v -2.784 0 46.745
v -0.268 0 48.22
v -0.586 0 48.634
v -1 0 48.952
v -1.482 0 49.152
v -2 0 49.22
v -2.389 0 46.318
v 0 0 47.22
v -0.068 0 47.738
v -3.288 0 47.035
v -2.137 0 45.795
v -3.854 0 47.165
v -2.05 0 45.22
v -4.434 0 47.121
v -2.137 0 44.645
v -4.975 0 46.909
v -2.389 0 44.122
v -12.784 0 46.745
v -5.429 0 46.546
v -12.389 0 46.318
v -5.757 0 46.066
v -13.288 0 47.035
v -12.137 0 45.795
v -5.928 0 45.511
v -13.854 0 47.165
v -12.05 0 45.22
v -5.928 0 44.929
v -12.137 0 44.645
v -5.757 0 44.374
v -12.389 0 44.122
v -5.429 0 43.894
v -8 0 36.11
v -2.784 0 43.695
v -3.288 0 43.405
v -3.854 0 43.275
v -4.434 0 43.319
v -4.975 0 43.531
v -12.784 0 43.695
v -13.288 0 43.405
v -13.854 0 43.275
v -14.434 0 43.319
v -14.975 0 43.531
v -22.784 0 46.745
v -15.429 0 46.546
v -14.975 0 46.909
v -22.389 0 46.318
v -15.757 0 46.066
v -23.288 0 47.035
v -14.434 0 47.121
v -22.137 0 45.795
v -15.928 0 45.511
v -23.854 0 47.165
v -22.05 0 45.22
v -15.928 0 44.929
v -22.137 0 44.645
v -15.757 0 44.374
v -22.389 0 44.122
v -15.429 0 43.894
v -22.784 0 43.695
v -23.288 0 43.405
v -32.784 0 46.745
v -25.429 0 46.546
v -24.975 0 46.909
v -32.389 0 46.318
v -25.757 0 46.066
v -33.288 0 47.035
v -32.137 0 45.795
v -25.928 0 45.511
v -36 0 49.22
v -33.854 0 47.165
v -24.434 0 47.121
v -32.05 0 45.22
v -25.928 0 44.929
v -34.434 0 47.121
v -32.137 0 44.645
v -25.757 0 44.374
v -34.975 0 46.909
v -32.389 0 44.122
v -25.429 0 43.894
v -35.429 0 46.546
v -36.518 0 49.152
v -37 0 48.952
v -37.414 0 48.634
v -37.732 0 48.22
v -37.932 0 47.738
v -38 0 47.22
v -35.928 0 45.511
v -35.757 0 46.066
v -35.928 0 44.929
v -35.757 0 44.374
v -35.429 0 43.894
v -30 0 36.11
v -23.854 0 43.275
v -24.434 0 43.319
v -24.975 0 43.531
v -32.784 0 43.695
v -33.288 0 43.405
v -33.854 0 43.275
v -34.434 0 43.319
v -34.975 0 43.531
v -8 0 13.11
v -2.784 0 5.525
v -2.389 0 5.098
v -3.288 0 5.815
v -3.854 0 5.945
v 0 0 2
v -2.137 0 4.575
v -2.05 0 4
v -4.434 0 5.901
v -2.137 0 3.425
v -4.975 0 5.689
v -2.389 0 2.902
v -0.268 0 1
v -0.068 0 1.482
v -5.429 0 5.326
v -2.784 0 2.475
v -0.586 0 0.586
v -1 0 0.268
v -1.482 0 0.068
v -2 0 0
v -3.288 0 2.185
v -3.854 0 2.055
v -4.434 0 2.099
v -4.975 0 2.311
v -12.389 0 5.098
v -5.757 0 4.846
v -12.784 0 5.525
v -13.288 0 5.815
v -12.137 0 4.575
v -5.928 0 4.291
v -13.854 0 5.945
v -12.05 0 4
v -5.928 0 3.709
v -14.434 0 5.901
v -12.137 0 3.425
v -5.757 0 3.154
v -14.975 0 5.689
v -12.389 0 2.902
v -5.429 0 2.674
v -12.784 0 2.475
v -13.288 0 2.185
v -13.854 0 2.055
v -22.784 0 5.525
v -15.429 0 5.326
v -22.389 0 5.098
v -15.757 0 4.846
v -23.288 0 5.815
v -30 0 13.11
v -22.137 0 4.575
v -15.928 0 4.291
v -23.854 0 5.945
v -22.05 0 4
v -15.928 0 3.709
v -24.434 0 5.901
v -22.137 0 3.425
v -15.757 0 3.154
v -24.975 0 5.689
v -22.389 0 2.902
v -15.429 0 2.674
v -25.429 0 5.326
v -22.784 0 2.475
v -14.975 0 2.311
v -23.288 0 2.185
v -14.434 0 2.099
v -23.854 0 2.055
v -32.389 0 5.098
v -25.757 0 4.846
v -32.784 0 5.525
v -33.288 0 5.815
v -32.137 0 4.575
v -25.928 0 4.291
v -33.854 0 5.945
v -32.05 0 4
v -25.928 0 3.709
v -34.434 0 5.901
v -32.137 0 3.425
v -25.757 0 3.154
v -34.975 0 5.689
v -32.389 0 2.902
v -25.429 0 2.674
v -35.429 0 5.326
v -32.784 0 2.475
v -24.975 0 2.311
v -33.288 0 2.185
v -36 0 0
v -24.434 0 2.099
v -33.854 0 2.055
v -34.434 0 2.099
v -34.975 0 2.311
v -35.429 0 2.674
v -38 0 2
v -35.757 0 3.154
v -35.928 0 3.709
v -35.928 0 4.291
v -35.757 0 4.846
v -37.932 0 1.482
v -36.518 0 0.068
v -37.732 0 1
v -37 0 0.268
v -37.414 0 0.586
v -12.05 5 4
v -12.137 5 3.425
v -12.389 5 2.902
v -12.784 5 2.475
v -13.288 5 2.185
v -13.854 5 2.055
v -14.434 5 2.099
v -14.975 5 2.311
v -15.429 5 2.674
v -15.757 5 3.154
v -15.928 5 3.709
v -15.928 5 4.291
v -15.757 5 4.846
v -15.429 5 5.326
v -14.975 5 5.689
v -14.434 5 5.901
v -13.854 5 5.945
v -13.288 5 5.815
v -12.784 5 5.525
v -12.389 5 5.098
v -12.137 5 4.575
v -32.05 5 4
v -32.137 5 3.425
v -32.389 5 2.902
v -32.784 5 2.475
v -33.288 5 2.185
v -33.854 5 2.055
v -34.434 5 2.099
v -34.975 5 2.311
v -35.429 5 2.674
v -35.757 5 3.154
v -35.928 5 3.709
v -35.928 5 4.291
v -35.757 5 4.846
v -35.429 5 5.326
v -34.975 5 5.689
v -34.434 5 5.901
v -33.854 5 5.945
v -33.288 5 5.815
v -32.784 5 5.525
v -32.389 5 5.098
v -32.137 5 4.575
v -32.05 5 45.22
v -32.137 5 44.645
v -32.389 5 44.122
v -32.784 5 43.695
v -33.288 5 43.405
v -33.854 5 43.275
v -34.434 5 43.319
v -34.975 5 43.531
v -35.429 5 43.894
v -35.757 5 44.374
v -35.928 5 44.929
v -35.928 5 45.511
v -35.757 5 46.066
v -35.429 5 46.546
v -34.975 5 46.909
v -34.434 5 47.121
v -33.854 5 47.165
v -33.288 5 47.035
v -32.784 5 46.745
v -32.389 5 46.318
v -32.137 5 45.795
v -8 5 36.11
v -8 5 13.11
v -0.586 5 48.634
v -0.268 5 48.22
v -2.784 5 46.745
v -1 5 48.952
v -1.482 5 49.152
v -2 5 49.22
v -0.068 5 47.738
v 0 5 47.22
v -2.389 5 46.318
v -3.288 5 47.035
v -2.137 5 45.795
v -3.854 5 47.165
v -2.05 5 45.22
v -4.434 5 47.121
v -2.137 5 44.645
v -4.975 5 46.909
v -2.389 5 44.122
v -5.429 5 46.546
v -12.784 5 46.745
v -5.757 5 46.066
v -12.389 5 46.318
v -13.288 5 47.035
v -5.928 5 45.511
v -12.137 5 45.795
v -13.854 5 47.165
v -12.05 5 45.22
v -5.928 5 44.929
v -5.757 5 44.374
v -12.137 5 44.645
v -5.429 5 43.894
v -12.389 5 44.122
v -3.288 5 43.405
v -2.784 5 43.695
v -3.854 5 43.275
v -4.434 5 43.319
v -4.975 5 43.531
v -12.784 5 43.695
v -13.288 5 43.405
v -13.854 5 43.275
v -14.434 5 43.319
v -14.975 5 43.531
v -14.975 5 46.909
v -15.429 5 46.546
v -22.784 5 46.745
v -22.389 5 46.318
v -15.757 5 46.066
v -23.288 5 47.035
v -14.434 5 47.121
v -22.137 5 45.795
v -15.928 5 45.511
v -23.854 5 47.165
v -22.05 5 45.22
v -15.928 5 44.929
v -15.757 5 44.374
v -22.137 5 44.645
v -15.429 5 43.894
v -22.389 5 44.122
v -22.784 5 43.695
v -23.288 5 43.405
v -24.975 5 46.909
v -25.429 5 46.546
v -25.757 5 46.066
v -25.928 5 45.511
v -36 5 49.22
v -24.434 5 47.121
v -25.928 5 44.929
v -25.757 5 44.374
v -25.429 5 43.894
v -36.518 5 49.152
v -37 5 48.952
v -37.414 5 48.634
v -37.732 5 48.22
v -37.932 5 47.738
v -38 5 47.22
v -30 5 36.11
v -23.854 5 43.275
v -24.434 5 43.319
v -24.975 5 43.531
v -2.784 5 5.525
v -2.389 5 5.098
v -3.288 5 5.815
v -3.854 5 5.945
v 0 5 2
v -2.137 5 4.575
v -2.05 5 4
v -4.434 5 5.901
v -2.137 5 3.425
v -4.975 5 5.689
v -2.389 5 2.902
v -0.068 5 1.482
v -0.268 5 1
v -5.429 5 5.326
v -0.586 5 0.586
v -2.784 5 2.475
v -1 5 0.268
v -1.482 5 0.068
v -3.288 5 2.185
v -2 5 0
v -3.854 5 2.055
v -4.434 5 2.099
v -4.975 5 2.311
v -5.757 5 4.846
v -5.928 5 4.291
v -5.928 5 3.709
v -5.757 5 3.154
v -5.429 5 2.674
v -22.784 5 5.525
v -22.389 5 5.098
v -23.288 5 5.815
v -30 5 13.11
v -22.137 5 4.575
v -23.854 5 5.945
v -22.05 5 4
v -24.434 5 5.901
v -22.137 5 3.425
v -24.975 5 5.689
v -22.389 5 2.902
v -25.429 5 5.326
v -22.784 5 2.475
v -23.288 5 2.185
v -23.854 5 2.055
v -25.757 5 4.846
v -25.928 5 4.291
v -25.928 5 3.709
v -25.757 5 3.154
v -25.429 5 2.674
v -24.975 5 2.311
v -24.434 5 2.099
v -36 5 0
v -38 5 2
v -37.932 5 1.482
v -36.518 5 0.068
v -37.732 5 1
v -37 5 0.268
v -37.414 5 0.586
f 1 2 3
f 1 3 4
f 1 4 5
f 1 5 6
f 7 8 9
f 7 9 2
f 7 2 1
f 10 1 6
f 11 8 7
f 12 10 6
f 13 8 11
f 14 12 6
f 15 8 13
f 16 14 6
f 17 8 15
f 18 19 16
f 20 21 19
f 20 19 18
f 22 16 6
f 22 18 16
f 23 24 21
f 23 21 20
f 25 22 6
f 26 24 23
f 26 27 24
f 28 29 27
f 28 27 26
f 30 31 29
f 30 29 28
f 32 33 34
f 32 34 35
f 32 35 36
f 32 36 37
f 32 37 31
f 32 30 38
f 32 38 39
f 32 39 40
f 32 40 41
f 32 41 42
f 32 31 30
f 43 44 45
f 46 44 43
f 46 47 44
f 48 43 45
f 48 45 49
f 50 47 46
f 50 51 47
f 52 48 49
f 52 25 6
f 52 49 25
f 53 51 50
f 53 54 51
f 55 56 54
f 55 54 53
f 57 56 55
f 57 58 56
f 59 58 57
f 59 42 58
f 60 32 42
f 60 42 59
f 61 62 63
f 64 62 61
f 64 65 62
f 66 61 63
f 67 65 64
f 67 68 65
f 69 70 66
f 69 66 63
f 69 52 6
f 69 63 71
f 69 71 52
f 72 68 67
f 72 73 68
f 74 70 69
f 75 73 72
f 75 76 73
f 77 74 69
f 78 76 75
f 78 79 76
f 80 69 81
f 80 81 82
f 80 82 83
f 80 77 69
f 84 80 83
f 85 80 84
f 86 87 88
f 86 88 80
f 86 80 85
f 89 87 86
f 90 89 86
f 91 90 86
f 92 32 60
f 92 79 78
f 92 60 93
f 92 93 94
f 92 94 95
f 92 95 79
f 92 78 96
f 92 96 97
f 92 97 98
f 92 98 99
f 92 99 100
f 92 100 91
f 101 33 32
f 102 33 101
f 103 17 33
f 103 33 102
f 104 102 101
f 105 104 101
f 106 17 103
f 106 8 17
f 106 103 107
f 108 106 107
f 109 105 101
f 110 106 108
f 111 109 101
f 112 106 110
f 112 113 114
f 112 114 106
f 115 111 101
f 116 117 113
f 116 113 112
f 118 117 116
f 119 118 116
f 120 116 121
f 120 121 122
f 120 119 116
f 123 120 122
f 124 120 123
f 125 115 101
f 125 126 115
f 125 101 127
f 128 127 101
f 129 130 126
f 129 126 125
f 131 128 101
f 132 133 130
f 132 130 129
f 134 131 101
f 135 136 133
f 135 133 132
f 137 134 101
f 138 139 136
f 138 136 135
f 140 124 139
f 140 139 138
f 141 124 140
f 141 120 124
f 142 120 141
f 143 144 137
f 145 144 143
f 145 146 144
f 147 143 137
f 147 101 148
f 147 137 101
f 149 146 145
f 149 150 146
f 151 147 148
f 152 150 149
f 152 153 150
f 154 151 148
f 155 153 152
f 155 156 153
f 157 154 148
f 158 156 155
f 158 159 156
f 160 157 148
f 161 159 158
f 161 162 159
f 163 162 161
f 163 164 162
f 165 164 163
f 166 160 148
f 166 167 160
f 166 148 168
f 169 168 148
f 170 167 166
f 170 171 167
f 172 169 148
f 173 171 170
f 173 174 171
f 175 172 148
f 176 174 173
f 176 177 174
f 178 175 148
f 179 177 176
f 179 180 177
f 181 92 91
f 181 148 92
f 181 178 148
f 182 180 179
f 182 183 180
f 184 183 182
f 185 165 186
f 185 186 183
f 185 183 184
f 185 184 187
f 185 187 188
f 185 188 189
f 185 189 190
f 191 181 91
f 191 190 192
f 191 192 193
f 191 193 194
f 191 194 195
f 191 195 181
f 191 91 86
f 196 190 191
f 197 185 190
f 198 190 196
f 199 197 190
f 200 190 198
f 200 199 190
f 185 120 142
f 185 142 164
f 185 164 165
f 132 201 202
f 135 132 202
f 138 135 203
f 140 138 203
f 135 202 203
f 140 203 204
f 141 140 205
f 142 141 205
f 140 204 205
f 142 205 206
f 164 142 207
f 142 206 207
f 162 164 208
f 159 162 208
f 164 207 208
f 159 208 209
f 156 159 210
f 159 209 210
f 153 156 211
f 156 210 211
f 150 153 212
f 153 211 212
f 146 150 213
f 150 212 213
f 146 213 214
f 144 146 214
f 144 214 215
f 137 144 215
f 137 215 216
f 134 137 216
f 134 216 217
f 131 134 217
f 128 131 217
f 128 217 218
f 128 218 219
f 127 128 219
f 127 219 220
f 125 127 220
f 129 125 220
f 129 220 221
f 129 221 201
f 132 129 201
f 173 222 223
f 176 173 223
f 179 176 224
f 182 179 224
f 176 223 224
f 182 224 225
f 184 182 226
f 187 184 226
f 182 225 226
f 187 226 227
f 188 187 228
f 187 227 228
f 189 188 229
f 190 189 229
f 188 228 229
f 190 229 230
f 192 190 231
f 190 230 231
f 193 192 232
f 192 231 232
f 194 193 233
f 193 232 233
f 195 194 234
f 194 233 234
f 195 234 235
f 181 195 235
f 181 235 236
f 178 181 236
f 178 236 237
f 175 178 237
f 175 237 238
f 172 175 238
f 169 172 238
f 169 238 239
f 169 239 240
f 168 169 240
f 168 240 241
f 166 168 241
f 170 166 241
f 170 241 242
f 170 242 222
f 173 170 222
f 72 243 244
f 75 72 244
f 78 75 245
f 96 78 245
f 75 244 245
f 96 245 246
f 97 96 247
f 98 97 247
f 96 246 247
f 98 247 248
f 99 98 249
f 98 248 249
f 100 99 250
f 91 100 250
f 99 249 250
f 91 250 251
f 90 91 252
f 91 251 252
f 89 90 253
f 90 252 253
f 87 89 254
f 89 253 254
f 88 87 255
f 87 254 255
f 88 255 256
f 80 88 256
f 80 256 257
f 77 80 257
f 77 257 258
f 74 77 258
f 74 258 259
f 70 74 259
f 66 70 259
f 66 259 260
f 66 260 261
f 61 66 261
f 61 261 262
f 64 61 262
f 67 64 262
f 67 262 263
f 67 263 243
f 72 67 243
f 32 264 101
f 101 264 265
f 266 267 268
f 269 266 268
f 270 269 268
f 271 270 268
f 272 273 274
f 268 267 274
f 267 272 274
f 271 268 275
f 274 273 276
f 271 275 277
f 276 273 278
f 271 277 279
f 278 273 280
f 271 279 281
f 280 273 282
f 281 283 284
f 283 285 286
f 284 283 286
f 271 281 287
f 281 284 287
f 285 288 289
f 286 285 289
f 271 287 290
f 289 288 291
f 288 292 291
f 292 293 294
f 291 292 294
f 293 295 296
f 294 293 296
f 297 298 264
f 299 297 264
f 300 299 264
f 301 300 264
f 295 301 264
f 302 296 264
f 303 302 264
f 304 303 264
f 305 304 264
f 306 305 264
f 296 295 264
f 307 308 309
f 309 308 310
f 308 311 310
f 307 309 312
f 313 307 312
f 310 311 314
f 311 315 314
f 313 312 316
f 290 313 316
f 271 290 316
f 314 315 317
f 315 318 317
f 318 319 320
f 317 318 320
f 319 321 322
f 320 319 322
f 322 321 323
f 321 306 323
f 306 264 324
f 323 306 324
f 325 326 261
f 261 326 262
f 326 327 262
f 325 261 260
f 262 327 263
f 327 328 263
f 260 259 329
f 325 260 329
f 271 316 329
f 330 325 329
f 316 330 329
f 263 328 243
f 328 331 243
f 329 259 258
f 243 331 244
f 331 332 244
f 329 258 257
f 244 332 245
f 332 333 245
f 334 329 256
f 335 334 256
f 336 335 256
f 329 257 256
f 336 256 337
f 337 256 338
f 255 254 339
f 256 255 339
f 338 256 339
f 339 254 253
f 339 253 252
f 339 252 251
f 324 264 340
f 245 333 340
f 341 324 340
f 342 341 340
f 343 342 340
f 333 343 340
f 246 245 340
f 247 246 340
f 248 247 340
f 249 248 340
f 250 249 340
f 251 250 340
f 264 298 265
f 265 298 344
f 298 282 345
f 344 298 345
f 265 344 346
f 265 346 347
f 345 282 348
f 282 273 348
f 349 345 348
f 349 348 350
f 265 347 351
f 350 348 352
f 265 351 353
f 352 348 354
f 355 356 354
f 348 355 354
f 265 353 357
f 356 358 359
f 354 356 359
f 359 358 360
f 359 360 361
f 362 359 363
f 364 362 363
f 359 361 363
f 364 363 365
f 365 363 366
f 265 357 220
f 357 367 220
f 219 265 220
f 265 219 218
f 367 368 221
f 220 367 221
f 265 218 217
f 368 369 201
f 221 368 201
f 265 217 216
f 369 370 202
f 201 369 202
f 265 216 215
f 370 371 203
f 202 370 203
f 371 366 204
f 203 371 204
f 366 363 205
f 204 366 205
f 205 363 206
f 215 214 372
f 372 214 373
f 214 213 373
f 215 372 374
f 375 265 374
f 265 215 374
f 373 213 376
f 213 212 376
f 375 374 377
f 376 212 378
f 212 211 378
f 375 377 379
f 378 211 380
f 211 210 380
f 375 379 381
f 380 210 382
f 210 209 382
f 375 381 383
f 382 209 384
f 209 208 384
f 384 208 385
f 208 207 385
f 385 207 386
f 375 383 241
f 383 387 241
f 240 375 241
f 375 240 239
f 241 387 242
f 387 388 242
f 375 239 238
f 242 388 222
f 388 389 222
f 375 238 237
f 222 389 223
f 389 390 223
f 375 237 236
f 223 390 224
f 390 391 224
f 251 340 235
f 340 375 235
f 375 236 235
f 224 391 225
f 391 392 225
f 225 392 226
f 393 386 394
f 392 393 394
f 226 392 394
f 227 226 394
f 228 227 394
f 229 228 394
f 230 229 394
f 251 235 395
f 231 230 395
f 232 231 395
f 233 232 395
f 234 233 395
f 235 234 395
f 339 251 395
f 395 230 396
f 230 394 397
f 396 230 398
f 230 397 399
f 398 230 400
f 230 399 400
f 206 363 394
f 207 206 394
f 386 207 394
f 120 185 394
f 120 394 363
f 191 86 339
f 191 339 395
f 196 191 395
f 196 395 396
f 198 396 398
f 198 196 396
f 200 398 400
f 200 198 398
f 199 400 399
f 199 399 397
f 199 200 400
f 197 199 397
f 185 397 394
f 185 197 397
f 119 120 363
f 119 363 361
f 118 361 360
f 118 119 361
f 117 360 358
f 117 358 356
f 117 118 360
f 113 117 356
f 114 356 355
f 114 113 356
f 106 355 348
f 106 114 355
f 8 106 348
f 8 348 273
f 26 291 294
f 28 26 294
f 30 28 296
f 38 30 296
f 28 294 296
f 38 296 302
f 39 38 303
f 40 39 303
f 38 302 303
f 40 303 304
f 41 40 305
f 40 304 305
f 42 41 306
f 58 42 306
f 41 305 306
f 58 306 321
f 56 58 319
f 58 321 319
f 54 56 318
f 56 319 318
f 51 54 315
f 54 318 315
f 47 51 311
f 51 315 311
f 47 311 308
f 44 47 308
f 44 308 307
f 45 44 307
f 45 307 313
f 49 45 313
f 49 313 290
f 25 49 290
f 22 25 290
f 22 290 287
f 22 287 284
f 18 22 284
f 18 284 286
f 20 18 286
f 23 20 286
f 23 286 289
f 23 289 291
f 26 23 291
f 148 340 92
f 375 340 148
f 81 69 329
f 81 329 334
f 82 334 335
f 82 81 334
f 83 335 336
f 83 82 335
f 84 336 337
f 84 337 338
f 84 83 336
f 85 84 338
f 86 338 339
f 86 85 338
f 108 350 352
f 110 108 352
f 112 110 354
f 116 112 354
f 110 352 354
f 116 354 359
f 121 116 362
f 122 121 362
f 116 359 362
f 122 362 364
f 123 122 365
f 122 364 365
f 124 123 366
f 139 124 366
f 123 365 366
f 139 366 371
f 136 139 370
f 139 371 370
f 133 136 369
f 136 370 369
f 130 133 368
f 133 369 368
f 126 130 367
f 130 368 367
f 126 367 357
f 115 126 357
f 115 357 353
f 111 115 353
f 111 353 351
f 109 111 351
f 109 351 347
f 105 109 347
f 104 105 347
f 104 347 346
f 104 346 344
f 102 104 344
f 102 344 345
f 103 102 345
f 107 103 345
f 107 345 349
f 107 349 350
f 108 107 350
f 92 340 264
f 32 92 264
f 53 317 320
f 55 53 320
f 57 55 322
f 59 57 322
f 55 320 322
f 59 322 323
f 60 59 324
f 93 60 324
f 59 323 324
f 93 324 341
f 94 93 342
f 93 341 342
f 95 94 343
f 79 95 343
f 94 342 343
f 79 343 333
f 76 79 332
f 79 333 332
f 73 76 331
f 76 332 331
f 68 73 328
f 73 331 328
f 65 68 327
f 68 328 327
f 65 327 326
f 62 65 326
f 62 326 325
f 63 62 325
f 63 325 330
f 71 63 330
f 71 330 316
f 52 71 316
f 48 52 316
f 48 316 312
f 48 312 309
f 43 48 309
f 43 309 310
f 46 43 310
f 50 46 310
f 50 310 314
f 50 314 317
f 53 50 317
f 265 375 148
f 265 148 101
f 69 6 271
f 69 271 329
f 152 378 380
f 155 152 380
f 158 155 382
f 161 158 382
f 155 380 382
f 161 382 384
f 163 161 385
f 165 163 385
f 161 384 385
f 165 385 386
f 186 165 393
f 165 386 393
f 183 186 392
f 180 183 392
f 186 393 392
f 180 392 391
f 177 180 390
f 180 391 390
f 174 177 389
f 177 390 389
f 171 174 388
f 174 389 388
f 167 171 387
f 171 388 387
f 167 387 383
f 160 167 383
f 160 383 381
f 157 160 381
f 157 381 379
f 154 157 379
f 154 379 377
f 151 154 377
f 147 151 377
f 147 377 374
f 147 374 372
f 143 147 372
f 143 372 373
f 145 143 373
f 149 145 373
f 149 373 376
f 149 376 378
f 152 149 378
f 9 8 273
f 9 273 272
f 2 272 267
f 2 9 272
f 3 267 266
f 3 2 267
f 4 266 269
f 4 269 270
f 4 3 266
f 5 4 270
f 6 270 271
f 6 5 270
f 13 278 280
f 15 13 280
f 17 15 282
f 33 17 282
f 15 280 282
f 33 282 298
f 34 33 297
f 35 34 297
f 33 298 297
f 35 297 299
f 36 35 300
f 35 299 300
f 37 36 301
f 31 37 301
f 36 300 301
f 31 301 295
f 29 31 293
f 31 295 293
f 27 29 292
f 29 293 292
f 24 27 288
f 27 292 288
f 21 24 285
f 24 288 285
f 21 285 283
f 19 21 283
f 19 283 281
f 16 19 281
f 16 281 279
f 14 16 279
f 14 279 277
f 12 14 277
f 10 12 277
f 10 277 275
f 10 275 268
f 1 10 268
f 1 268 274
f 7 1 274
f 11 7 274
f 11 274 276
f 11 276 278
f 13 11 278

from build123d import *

# Parameters (mm, degrees)
BOSS_EXTRUDE1_DEPTH = 5
SKETCH2_R           = 1.95
SKETCH2_W           = 22
SKETCH2_H           = 23
CUT_EXTRUDE1_DEPTH  = 6


with BuildPart() as part:
    # Sketch1 → Boss-Extrude1 (new body)
    with BuildSketch(Plane(origin=(0, 0, 0), x_dir=(1, 0, 0), z_dir=(0, 1, 0))):
        with BuildLine():
            Line((-36, 0), (-2, 0))
            ThreePointArc((-2, 0), (-0.585786438, -0.585786438), (0, -2))
            Line((0, -2), (0, -47.22))
            ThreePointArc((0, -47.22), (-0.585786438, -48.634213562), (-2, -49.22))
            Line((-2, -49.22), (-36, -49.22))
            ThreePointArc((-36, -49.22), (-37.414213562, -48.634213562), (-38, -47.22))
            Line((-38, -47.22), (-38, -2))
            ThreePointArc((-38, -2), (-37.414213562, -0.585786438), (-36, 0))
        make_face()
    extrude(amount=BOSS_EXTRUDE1_DEPTH)

    # Sketch2 → Cut-Extrude1 (cut, through all)
    with BuildSketch(Plane(origin=(0, 5, 0), x_dir=(1, 0, 0), z_dir=(0, 1, 0))):
        with Locations((-4, -4)):
            Circle(SKETCH2_R)
        with Locations((-14, -4)):
            Circle(SKETCH2_R)
        with Locations((-24, -4)):
            Circle(SKETCH2_R)
        with Locations((-54, -4)):
            Circle(SKETCH2_R)
        with Locations((-34, -4)):
            Circle(SKETCH2_R)
        with Locations((-44, -4)):
            Circle(SKETCH2_R)
        with Locations((-44, -45.22)):
            Circle(SKETCH2_R)
        with Locations((-34, -45.22)):
            Circle(SKETCH2_R)
        with Locations((-54, -45.22)):
            Circle(SKETCH2_R)
        with Locations((-24, -45.22)):
            Circle(SKETCH2_R)
        with Locations((-14, -45.22)):
            Circle(SKETCH2_R)
        with Locations((-4, -45.22)):
            Circle(SKETCH2_R)
        with Locations((-19, -24.61)):
            Rectangle(SKETCH2_W, SKETCH2_H)
    extrude(amount=-CUT_EXTRUDE1_DEPTH, mode=Mode.SUBTRACT)


solid = part.part
